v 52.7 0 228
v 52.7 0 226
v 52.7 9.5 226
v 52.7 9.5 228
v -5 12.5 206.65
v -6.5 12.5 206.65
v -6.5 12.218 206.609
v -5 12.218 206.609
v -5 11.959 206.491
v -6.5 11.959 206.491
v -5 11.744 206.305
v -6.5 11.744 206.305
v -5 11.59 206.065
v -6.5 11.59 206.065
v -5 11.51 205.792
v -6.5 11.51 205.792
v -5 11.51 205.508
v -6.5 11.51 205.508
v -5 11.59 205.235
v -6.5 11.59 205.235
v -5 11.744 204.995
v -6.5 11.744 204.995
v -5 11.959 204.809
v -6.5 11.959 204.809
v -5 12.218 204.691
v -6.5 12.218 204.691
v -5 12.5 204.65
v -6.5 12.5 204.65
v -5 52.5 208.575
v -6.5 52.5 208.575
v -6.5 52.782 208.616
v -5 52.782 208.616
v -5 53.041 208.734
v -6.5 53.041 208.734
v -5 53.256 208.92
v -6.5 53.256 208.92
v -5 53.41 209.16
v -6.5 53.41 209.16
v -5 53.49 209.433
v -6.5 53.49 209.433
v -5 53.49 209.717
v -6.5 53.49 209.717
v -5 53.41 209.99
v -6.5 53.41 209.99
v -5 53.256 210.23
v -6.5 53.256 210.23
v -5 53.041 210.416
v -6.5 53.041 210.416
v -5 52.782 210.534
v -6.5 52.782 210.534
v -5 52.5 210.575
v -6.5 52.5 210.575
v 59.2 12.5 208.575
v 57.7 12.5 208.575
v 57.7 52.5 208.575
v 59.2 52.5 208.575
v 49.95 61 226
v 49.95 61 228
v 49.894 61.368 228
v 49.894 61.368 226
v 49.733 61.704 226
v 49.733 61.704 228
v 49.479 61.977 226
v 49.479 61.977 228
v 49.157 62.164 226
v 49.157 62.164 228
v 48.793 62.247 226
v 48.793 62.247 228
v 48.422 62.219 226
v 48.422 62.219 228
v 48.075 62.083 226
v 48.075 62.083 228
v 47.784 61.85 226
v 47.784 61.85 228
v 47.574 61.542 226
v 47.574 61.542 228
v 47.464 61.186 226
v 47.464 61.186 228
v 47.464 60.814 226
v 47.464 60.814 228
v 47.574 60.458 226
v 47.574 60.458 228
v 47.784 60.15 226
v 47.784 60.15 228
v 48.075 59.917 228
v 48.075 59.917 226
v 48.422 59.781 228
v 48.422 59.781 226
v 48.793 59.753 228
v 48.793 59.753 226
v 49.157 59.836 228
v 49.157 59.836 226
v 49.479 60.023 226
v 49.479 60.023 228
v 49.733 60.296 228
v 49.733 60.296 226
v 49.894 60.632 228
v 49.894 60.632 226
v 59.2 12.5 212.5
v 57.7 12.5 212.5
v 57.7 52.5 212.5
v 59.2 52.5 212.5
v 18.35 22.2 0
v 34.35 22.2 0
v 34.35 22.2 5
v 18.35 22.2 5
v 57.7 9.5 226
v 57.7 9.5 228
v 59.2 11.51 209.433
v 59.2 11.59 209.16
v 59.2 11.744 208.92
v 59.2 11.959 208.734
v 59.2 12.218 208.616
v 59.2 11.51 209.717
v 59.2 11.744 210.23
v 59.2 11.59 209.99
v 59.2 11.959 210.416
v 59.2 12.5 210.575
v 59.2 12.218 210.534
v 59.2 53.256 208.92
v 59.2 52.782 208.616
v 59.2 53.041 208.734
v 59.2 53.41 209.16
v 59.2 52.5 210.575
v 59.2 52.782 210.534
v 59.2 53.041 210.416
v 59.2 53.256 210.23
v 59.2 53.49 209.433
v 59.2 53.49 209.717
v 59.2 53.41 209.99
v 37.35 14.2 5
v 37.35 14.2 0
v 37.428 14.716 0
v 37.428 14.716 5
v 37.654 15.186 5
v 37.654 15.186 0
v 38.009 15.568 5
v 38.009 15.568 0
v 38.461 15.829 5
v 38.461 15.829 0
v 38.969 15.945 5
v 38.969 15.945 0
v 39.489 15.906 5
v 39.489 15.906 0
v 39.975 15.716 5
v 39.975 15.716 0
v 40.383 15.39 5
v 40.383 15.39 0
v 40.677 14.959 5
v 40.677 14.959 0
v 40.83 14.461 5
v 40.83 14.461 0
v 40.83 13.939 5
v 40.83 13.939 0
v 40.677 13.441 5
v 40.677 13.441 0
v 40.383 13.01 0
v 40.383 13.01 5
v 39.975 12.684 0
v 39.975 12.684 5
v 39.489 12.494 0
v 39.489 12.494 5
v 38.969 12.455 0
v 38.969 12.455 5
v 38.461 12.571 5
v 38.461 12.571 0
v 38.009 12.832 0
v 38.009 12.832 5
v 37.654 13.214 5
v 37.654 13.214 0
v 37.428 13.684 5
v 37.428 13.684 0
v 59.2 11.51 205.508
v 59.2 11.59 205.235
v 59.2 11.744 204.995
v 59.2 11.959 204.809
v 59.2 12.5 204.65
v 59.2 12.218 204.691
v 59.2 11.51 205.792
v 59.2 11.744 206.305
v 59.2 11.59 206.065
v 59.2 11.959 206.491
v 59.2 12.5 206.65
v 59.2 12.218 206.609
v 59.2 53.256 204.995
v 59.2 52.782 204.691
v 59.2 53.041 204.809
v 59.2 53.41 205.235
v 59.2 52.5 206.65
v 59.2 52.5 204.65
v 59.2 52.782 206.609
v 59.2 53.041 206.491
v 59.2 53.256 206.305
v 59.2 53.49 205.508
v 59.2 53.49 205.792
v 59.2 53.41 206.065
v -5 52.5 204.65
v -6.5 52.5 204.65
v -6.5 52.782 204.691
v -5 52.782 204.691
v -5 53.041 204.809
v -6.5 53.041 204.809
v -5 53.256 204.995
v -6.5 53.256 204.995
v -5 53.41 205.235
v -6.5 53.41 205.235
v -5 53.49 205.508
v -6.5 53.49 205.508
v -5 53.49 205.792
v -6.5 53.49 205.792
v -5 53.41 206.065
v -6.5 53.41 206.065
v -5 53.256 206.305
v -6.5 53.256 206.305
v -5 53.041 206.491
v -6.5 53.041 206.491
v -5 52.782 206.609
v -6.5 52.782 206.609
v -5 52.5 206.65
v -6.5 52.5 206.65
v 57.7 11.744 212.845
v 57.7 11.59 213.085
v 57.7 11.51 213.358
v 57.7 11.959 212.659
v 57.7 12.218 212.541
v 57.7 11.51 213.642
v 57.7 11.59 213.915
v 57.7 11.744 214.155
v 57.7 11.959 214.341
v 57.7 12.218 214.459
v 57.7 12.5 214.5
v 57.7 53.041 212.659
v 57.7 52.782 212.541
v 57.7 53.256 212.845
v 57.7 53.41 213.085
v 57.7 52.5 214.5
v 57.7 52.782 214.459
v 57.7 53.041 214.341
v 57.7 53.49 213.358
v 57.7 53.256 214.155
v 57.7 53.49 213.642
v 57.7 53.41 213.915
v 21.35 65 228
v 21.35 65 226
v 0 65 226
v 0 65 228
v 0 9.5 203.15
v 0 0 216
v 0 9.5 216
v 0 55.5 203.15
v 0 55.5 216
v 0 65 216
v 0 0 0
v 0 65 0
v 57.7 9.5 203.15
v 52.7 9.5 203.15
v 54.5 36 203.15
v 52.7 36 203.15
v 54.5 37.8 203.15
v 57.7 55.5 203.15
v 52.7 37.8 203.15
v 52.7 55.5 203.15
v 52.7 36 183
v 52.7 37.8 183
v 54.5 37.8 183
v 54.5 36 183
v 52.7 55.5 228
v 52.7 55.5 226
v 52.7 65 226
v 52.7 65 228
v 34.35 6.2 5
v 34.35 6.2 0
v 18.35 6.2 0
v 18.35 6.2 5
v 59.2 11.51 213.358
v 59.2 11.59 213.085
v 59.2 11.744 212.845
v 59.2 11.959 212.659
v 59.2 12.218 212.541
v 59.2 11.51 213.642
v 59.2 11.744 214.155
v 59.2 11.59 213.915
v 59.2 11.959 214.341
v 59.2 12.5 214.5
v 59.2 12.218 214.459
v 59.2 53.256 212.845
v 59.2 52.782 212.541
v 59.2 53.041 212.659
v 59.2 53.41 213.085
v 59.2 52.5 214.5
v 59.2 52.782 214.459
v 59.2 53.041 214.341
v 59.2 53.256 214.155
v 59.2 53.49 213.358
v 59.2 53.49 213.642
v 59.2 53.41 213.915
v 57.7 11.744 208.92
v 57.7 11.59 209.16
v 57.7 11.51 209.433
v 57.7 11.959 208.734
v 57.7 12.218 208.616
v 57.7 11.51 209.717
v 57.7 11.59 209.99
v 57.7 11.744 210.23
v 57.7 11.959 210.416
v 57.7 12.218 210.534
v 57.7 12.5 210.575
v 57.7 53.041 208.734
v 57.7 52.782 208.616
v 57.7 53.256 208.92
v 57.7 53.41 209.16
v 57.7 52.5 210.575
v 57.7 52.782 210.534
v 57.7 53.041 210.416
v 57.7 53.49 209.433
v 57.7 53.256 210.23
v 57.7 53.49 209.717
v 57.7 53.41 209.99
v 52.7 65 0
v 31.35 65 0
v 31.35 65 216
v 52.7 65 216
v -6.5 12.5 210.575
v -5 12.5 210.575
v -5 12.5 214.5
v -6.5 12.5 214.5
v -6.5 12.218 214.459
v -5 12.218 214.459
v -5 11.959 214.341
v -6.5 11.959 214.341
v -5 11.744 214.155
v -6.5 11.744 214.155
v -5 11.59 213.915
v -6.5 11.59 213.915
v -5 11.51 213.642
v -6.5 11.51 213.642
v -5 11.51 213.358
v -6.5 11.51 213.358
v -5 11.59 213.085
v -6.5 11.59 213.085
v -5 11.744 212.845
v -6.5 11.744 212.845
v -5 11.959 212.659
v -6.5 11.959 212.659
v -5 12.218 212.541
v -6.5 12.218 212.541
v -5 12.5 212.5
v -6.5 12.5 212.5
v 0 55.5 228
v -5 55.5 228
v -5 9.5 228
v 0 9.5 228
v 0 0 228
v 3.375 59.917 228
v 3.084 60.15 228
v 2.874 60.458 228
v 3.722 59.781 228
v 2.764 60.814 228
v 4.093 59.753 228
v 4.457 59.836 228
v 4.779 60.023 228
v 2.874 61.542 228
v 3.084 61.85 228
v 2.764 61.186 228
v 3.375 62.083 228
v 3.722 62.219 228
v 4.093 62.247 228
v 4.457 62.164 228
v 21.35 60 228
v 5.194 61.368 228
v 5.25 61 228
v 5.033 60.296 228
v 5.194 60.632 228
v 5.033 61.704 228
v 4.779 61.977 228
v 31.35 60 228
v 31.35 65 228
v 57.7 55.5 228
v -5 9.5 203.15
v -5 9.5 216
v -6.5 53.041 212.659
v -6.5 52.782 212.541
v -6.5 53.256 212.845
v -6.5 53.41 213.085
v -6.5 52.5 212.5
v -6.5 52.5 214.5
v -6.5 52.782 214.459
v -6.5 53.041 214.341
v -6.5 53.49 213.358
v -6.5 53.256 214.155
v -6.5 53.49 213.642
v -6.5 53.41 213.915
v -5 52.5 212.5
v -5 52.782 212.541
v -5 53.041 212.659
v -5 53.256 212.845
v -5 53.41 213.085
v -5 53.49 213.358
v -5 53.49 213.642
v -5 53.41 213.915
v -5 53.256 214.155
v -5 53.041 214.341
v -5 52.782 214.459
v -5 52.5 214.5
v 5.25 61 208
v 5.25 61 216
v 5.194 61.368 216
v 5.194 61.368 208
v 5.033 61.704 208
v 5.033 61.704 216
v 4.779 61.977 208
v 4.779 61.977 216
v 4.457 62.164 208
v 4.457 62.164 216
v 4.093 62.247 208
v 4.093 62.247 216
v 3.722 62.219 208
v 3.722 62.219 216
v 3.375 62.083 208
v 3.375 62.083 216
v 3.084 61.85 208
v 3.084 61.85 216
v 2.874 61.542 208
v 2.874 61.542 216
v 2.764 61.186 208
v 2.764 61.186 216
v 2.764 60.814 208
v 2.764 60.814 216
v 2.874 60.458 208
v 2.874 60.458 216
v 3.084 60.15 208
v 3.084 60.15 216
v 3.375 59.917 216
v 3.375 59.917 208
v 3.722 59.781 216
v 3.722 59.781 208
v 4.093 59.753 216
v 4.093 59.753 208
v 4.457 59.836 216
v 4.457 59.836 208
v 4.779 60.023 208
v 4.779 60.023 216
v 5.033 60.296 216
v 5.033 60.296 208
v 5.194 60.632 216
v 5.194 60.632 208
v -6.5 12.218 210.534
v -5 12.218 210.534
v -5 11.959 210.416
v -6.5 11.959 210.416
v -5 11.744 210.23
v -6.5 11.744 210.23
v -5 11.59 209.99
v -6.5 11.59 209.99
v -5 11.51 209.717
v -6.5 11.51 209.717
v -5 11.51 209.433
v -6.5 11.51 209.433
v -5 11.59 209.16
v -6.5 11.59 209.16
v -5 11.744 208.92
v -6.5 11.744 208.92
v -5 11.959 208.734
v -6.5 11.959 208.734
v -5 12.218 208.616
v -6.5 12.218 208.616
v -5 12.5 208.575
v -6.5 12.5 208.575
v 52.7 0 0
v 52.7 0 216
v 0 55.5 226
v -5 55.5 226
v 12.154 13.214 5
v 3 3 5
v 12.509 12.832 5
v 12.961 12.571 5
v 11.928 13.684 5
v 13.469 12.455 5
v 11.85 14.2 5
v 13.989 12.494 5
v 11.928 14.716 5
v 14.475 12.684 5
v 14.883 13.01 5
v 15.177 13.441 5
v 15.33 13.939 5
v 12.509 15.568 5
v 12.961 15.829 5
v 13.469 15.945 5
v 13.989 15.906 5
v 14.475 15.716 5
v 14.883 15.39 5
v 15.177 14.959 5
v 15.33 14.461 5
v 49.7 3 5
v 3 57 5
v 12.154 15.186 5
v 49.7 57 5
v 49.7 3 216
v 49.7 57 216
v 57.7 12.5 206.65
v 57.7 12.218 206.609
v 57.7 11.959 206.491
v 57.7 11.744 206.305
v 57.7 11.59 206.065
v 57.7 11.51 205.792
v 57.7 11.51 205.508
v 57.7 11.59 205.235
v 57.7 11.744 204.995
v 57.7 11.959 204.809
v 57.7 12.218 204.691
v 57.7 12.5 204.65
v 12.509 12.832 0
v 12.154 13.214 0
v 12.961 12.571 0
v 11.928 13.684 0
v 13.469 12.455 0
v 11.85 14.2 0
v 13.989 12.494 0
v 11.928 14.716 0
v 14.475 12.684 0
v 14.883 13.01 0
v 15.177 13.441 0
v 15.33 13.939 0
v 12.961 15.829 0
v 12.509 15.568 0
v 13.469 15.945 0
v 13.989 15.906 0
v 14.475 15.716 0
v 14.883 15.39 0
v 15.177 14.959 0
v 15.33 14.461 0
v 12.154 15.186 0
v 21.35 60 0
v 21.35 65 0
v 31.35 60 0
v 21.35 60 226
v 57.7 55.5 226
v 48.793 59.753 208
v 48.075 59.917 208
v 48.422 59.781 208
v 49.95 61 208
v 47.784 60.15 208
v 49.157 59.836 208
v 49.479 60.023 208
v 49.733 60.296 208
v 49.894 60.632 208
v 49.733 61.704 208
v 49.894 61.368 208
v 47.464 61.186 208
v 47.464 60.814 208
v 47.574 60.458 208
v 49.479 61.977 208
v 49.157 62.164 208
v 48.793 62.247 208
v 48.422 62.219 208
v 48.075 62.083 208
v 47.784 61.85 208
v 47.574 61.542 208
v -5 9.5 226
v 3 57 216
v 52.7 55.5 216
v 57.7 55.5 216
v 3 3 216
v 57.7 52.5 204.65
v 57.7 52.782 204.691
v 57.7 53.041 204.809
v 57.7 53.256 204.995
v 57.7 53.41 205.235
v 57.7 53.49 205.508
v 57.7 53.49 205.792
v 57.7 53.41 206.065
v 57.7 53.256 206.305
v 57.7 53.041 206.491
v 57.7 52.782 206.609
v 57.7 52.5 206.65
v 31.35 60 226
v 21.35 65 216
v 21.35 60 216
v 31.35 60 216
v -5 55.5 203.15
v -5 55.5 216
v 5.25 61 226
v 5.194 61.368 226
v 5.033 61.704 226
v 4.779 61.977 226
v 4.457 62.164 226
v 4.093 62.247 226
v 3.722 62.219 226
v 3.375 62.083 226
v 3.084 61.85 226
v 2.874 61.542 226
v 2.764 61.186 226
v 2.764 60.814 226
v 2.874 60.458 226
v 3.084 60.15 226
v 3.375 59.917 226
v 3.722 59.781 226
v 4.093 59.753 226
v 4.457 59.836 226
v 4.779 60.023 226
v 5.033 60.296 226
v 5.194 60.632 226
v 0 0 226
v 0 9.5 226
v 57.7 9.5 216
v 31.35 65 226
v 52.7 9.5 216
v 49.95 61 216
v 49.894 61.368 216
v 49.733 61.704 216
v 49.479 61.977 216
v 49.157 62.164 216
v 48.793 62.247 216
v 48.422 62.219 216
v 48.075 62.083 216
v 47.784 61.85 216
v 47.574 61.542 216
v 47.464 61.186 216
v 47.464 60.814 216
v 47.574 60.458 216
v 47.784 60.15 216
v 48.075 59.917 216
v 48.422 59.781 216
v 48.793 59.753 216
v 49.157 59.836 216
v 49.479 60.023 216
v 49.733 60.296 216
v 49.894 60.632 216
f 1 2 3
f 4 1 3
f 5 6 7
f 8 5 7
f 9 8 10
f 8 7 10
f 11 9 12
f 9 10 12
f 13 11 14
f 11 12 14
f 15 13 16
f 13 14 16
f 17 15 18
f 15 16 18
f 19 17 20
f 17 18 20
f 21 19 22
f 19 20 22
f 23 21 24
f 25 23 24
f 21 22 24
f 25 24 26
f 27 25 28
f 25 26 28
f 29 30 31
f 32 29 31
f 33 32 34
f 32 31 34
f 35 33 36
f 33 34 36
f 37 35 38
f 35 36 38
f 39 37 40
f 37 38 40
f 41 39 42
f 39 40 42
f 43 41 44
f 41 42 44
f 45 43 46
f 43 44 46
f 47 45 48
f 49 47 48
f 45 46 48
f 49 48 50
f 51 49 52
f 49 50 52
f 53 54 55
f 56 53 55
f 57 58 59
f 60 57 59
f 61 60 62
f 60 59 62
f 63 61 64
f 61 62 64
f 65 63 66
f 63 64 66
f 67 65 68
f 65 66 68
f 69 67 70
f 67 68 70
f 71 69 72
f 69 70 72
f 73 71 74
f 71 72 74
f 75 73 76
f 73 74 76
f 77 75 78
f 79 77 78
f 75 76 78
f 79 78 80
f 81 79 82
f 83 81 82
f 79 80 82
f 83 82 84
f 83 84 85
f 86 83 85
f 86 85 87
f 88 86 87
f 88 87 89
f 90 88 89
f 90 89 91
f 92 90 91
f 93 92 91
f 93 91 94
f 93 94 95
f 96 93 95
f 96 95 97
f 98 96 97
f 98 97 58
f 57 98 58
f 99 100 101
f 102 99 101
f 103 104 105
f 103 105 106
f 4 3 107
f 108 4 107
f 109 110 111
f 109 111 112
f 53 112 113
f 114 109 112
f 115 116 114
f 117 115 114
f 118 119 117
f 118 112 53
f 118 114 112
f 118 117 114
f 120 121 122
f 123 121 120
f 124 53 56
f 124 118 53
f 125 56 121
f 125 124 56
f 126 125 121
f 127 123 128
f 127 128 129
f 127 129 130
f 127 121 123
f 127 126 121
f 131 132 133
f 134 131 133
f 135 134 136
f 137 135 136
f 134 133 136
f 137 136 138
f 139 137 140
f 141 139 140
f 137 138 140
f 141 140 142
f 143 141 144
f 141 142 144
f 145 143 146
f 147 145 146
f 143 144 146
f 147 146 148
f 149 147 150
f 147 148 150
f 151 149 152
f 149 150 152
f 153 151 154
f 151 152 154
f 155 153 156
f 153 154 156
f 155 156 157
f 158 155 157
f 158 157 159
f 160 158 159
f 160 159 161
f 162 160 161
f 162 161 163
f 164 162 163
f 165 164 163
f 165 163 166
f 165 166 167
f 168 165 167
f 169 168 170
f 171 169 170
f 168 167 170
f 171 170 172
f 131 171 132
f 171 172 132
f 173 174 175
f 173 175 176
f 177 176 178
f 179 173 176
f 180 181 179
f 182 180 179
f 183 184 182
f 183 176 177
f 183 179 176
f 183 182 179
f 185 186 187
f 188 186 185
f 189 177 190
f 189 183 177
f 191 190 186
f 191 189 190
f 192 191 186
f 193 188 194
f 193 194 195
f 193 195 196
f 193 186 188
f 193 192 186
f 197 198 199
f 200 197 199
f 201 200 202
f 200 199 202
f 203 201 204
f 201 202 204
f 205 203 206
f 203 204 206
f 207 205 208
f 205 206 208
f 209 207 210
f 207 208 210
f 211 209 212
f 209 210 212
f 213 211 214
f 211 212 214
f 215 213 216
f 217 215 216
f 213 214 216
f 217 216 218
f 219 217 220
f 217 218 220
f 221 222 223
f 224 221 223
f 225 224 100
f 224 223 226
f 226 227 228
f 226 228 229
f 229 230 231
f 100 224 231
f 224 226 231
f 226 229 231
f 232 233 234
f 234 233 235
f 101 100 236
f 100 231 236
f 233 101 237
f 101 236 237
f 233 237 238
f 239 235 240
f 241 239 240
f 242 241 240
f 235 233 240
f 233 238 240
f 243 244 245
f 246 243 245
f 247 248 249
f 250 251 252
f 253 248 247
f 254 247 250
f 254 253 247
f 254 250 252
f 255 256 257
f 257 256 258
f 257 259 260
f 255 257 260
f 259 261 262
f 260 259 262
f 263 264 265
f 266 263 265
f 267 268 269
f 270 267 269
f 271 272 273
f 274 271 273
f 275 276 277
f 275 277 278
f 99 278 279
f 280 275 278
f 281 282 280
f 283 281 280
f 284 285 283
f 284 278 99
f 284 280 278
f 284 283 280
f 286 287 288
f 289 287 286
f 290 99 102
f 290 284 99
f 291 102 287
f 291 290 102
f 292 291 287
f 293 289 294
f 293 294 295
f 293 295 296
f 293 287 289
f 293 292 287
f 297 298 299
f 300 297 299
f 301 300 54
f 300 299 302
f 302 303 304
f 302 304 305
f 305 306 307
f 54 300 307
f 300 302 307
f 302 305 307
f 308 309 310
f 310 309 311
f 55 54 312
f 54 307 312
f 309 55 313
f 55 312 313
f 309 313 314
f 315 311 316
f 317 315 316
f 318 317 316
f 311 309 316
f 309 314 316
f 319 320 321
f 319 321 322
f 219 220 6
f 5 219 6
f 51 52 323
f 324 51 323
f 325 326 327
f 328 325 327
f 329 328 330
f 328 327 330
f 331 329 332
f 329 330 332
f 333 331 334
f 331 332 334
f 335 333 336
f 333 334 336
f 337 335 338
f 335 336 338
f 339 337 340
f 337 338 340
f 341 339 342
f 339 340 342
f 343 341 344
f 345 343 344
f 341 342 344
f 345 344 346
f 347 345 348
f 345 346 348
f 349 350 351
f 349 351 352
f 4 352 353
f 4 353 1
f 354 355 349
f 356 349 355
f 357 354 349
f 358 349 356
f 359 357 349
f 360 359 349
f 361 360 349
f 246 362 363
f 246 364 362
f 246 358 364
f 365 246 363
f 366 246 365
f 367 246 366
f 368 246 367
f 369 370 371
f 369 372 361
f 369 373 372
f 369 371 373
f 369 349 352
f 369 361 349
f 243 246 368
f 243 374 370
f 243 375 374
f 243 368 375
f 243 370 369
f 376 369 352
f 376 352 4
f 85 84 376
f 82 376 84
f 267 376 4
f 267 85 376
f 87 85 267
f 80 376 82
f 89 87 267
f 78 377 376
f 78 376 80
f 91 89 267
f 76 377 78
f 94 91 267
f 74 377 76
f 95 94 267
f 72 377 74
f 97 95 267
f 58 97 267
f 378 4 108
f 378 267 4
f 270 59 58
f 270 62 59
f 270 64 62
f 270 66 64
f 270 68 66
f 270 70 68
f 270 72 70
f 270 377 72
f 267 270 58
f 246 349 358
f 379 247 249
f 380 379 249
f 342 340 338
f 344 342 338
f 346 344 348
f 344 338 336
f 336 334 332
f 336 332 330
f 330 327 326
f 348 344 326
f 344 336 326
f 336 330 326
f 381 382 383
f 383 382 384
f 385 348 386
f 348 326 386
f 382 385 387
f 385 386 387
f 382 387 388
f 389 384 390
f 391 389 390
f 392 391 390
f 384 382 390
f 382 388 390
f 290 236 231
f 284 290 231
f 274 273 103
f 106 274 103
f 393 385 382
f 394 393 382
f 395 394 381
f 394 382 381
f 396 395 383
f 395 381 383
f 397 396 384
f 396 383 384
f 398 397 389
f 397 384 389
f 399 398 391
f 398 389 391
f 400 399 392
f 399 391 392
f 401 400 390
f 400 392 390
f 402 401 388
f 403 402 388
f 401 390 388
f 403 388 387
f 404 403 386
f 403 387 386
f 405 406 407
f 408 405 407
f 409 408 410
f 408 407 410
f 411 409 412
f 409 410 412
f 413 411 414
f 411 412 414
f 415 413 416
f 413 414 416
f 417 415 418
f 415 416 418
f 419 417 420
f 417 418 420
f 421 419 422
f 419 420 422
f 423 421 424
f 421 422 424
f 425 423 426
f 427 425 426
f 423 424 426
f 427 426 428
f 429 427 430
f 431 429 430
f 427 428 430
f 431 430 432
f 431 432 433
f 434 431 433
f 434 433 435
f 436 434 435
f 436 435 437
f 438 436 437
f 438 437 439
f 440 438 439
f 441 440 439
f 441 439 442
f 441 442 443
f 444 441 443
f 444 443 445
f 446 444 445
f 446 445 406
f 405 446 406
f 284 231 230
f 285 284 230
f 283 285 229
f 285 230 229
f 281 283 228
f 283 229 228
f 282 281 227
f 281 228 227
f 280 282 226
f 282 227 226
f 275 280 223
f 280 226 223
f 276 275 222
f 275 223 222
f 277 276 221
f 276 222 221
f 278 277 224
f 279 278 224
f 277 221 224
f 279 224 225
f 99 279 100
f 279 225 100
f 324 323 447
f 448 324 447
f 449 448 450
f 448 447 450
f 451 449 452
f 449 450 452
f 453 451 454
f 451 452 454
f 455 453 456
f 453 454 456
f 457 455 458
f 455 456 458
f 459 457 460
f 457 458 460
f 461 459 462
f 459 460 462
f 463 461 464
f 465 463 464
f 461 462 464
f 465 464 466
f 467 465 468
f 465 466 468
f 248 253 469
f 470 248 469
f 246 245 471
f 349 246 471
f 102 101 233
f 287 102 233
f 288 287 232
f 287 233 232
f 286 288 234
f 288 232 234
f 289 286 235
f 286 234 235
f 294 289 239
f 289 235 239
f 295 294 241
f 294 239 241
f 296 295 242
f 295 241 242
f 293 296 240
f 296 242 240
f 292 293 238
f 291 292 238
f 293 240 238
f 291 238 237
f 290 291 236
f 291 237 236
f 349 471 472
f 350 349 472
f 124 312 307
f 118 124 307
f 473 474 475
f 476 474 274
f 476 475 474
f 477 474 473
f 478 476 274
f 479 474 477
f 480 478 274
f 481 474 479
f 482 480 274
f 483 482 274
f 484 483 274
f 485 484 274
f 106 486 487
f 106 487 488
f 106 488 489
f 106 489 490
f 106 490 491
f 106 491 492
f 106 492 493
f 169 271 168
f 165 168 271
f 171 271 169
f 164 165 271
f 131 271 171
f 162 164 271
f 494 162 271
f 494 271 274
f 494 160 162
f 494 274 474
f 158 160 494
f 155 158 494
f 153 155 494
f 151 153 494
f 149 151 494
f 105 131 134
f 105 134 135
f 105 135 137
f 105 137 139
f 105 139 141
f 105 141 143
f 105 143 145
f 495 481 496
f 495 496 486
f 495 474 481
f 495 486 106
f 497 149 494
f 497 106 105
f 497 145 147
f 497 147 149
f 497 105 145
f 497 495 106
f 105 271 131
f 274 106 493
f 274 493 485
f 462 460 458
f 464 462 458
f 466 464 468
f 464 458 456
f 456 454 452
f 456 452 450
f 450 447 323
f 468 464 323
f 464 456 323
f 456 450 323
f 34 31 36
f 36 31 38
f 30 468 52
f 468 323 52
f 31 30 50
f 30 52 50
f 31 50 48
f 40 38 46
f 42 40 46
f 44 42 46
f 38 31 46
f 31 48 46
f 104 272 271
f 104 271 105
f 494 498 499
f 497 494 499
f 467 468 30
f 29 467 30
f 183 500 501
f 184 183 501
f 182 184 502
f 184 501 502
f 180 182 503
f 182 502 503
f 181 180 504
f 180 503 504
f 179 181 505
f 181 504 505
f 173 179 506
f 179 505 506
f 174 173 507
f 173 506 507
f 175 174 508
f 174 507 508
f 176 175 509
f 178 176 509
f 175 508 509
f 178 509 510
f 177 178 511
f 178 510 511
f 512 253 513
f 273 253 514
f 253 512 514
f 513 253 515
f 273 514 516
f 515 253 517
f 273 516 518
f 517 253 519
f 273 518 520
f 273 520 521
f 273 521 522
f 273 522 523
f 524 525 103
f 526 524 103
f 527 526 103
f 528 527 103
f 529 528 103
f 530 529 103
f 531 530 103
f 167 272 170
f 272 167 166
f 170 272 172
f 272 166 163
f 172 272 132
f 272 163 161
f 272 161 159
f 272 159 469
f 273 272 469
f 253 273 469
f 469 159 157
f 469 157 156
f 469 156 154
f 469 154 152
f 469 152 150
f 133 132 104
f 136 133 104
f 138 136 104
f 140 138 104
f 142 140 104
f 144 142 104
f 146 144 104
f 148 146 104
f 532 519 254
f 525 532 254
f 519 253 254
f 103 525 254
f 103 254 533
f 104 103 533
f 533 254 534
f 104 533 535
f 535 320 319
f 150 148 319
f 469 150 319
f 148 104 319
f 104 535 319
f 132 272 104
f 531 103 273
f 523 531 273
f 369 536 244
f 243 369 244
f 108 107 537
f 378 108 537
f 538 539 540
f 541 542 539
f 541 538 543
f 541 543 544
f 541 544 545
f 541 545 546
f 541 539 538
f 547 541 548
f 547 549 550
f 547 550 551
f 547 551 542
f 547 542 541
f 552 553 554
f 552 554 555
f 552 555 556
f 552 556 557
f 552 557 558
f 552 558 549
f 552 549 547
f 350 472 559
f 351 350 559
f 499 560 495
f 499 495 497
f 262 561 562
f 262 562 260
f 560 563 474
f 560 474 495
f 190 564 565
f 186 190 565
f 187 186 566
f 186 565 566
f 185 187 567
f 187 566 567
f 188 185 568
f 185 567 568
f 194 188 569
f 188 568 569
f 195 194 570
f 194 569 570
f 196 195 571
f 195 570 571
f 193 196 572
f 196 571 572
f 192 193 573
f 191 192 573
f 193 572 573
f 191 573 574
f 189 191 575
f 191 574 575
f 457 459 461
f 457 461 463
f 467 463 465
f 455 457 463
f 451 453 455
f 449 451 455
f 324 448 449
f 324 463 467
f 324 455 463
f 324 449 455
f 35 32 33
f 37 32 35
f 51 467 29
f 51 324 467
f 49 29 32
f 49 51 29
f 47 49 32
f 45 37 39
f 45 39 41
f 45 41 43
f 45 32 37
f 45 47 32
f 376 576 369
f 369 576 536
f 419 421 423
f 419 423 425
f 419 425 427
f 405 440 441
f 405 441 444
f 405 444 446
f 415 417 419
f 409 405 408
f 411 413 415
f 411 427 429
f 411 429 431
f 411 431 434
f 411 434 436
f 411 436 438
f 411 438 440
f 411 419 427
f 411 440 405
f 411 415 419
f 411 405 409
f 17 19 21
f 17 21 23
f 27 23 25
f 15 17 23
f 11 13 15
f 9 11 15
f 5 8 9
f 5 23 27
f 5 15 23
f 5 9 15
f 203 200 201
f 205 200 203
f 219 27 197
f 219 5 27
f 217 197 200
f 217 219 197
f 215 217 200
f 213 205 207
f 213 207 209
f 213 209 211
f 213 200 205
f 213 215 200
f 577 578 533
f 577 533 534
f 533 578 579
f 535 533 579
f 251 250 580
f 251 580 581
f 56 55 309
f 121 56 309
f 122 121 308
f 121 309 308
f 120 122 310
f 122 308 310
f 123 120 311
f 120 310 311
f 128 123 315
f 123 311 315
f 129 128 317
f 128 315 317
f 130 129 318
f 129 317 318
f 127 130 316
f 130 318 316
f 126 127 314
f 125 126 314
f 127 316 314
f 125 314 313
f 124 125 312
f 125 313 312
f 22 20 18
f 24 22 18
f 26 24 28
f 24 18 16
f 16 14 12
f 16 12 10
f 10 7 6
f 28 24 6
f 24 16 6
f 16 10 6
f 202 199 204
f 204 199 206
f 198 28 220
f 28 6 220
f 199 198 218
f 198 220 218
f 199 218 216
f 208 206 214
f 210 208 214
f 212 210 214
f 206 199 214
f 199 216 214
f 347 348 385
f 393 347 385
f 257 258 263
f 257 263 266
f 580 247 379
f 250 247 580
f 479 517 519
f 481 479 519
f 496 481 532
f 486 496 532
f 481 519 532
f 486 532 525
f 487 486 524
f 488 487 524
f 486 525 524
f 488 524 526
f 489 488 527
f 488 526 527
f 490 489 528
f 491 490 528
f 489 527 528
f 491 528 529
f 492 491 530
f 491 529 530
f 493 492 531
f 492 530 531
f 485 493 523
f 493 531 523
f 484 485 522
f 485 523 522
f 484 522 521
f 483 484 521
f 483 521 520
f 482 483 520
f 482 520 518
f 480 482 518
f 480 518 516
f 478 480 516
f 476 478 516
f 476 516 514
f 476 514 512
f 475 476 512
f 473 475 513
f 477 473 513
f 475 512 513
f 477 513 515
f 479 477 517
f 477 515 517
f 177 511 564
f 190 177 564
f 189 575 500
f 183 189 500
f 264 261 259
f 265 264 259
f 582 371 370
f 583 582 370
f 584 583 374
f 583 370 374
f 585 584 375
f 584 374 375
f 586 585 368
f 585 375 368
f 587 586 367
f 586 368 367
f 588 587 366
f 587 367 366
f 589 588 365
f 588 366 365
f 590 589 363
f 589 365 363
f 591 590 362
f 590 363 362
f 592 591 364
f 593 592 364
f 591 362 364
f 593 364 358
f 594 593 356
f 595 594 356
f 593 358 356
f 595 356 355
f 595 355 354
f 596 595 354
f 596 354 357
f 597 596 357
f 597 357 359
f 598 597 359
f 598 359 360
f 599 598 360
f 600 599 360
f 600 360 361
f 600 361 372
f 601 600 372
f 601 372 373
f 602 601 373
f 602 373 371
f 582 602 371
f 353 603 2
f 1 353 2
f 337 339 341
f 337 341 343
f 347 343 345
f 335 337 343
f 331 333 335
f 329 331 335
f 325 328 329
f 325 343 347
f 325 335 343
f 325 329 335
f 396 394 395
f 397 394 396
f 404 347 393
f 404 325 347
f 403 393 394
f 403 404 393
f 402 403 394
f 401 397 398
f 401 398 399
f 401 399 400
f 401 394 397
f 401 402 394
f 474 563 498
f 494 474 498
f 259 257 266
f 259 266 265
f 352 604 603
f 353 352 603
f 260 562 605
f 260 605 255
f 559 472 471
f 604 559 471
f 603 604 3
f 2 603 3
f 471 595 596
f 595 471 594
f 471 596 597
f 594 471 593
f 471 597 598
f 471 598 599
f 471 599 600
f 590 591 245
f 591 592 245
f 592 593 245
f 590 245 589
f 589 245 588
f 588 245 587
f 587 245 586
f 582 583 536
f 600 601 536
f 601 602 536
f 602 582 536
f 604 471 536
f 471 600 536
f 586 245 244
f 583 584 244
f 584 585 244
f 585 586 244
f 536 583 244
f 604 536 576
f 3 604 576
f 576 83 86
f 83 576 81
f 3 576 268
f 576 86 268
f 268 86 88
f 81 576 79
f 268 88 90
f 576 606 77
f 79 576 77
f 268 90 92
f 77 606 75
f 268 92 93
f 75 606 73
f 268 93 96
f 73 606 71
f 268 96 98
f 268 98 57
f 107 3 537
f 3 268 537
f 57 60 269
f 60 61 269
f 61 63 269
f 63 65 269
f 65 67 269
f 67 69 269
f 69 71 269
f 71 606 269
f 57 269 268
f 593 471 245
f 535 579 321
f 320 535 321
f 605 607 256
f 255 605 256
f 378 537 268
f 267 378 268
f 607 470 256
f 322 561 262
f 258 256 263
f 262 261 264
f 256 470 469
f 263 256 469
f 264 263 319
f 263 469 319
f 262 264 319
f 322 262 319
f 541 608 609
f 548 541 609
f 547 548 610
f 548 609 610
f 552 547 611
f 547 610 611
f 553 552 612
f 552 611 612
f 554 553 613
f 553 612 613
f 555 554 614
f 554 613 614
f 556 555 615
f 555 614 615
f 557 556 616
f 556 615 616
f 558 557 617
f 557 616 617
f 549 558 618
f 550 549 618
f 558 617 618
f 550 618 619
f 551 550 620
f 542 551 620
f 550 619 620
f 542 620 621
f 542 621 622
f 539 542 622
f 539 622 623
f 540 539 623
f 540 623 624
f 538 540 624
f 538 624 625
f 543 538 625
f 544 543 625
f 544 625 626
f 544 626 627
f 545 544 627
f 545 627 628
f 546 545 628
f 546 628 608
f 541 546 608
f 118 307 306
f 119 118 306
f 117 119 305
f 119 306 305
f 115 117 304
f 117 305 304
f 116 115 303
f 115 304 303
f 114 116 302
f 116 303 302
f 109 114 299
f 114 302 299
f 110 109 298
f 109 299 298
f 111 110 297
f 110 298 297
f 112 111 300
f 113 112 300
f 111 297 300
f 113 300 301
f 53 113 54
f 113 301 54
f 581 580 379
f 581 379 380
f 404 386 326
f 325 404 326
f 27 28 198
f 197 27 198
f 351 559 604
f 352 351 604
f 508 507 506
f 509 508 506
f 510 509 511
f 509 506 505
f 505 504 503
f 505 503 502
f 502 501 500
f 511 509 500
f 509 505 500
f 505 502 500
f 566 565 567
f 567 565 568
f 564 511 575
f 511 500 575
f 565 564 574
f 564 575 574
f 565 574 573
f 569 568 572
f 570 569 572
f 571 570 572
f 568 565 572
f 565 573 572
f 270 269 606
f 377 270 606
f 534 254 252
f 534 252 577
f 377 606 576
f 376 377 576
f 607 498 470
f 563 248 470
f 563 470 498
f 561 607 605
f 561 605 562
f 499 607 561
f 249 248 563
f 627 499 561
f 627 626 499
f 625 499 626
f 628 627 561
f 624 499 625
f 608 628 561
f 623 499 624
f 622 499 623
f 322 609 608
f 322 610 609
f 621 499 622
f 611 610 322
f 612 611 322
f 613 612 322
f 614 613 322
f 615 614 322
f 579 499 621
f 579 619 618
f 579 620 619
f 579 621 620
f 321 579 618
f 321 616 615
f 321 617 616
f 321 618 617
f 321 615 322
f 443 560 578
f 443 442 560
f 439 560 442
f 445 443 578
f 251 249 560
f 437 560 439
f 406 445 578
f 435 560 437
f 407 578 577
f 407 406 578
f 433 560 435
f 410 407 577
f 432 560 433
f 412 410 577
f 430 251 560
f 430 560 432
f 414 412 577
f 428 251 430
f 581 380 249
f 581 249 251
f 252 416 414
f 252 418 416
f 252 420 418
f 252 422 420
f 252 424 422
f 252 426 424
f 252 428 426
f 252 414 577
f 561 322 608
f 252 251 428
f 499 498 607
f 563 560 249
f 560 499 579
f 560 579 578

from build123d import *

# Parameters (mm, degrees)
SKETCH_1_W             = 52.7
SKETCH_1_H             = 65
EXTRUDE_1_DEPTH        = 216
SKETCH_2_W             = 10
SKETCH_2_H             = 5
CUT_EXTRUDE_1_DEPTH    = 232.642591075
SKETCH_3_W             = 46.7
SKETCH_3_H             = 54
CUT_EXTRUDE_2_DEPTH    = 211
SKETCH_6_R             = 1.75
SKETCH_6_W             = 16
SKETCH_6_H             = 16
CUT_EXTRUDE_3_DEPTH    = 5
SKETCH_7_W             = 1.8
SKETCH_7_H             = 1.8
EXTRUDE_2_DEPTH        = 33
SKETCH_9_W             = 12.85
SKETCH_9_H             = 46
EXTRUDE_3_DEPTH        = 5
SKETCH_10_W            = 12.85
SKETCH_10_H            = 46
EXTRUDE_4_DEPTH        = 5
EXTRUDE_5_DEPTH        = 1.5
EXTRUDE_START          = 1.5
EXTRUDE_6_DEPTH        = 1.5
EXTRUDE_7_DEPTH        = 2
SKETCH_15_R            = 1.25
CUT_EXTRUDE_4_DEPTH    = 20
SPLIT_START            = 57.7
SPLIT_BODIES_1_DEPTH   = 1.5
SPLIT_BODIES_1_2_DEPTH = 1.5
SPLIT_BODIES_1_3_DEPTH = 1.5
SPLIT_START_2          = -6.5
SPLIT_BODIES_1_4_DEPTH = 1.5
SPLIT_BODIES_1_5_DEPTH = 1.5
SPLIT_BODIES_1_6_DEPTH = 1.5
SPLIT_BODIES_1_7_DEPTH = 1.5
SPLIT_BODIES_1_8_DEPTH = 1.5


# Read off the part's stored shape, not the designer's step: 分割1
with BuildPart() as part:
    # 草图1 → 凸台-拉伸1 (new body)
    with BuildSketch(Plane.XY):
        with Locations((26.35, 32.5)):
            Rectangle(SKETCH_1_W, SKETCH_1_H)
    extrude(amount=EXTRUDE_1_DEPTH)

    # 草图2 → 切除-拉伸1 (cut, through all)
    with BuildSketch(Plane.XY.offset(216)):
        with Locations((26.35, 62.5)):
            Rectangle(SKETCH_2_W, SKETCH_2_H)
    extrude(amount=-CUT_EXTRUDE_1_DEPTH, mode=Mode.SUBTRACT)

    # 草图3 → 切除-拉伸2 (cut)
    with BuildSketch(Plane.XY.offset(216)):
        with Locations((26.35, 30)):
            Rectangle(SKETCH_3_W, SKETCH_3_H)
    extrude(amount=-CUT_EXTRUDE_2_DEPTH, mode=Mode.SUBTRACT)

    # 草图6 → 切除-拉伸3 (cut)
    with BuildSketch(Plane(origin=(0, 0, 0), x_dir=(-1, 0, 0), z_dir=(0, 0, -1))):
        with Locations((-13.6, 14.2)):
            Circle(SKETCH_6_R)
        with Locations((-39.1, 14.2)):
            Circle(SKETCH_6_R)
        with Locations((-26.35, 14.2)):
            Rectangle(SKETCH_6_W, SKETCH_6_H)
    extrude(amount=-CUT_EXTRUDE_3_DEPTH, mode=Mode.SUBTRACT)

    # 草图7 → 凸台-拉伸2 (add)
    with BuildSketch(Plane.XY.offset(216)):
        with Locations((53.6, 36.9)):
            Rectangle(SKETCH_7_W, SKETCH_7_H)
    extrude(amount=-EXTRUDE_2_DEPTH)

    # 草图9 → 凸台-拉伸3 (add)
    with BuildSketch(Plane.ZY):
        with Locations((209.575, 32.5)):
            Rectangle(SKETCH_9_W, SKETCH_9_H)
    extrude(amount=EXTRUDE_3_DEPTH)

    # 草图10 → 凸台-拉伸4 (add)
    with BuildSketch(Plane(origin=(52.7, 0, 0), x_dir=(0, 0, -1), z_dir=(1, 0, 0))):
        with Locations((-209.575, 32.5)):
            Rectangle(SKETCH_10_W, SKETCH_10_H)
    extrude(amount=EXTRUDE_4_DEPTH)

    # 草图11 → 凸台-拉伸5 (add)
    with BuildSketch(Plane(origin=(57.7, 0, 0), x_dir=(0, 0, -1), z_dir=(1, 0, 0))):
        with BuildLine():
            Line((-214.5, 12.5), (-214.5, 52.5))
            ThreePointArc((-214.5, 52.5), (-213.5, 53.5), (-212.5, 52.5))
            Line((-212.5, 52.5), (-212.5, 12.5))
            ThreePointArc((-212.5, 12.5), (-213.5, 11.5), (-214.5, 12.5))
        make_face()
        with BuildLine():
            Line((-210.575, 12.5), (-210.575, 52.5))
            ThreePointArc((-210.575, 52.5), (-209.575, 53.5), (-208.575, 52.5))
            Line((-208.575, 52.5), (-208.575, 12.5))
            ThreePointArc((-208.575, 12.5), (-209.575, 11.5), (-210.575, 12.5))
        make_face()
        with BuildLine():
            Line((-206.65, 12.5), (-206.65, 52.5))
            ThreePointArc((-206.65, 52.5), (-205.65, 53.5), (-204.65, 52.5))
            Line((-204.65, 52.5), (-204.65, 12.5))
            ThreePointArc((-204.65, 12.5), (-205.65, 11.5), (-206.65, 12.5))
        make_face()
    extrude(amount=EXTRUDE_5_DEPTH)

    # 草图12 → 凸台-拉伸6 (add)
    with BuildSketch(Plane.ZY.offset(5).offset(EXTRUDE_START)):
        with BuildLine():
            Line((214.5, 12.5), (214.5, 52.5))
            ThreePointArc((214.5, 52.5), (213.5, 53.5), (212.5, 52.5))
            Line((212.5, 52.5), (212.5, 12.5))
            ThreePointArc((212.5, 12.5), (213.5, 11.5), (214.5, 12.5))
        make_face()
        with BuildLine():
            Line((206.65, 12.5), (206.65, 52.5))
            ThreePointArc((206.65, 52.5), (205.65, 53.5), (204.65, 52.5))
            Line((204.65, 52.5), (204.65, 12.5))
            ThreePointArc((204.65, 12.5), (205.65, 11.5), (206.65, 12.5))
        make_face()
        with BuildLine():
            Line((210.575, 12.5), (210.575, 52.5))
            ThreePointArc((210.575, 52.5), (209.575, 53.5), (208.575, 52.5))
            Line((208.575, 52.5), (208.575, 12.5))
            ThreePointArc((208.575, 12.5), (209.575, 11.5), (210.575, 12.5))
        make_face()
    extrude(amount=-EXTRUDE_6_DEPTH)


with BuildPart() as body_2:
    # 草图14 → 凸台-拉伸7 (new body)
    with BuildSketch(Plane.XY.offset(226)):
        Polygon((57.7, 55.5), (52.7, 55.5), (52.7, 65), (31.35, 65), (31.35, 60), (21.35, 60), (21.35, 65), (0, 65), (0, 55.5), (-5, 55.5), (-5, 9.5), (0, 9.5), (0, 0), (52.7, 0), (52.7, 9.5), (57.7, 9.5), align=None)
    extrude(amount=EXTRUDE_7_DEPTH)


with BuildPart() as cut_extrude_4_tool:
    # 草图15 → 切除-拉伸4 (new body)
    with BuildSketch(Plane.XY.offset(228)):
        with Locations((4, 61)):
            Circle(SKETCH_15_R)
        with Locations((48.7, 61)):
            Circle(SKETCH_15_R)
    extrude(amount=-CUT_EXTRUDE_4_DEPTH)


with BuildPart() as part_1:
    add(part.part)

    # 切除-拉伸4: cut by cut_extrude_4_tool
    add(cut_extrude_4_tool.part, mode=Mode.SUBTRACT)

    # Split Bodies 1 7 outline → Split Bodies 1 7 (cut)
    with BuildSketch(Plane.YZ.offset(SPLIT_START_2)):
        with BuildLine():
            ThreePointArc((12.5, 214.5), (11.5, 213.5), (12.5, 212.5))
            Line((12.5, 212.5), (52.5, 212.5))
            ThreePointArc((52.5, 212.5), (53.5, 213.5), (52.5, 214.5))
            Line((52.5, 214.5), (12.5, 214.5))
        make_face()
        with BuildLine():
            ThreePointArc((12.5, 210.575), (11.5, 209.575), (12.5, 208.575))
            Line((12.5, 208.575), (52.5, 208.575))
            ThreePointArc((52.5, 208.575), (53.5, 209.575), (52.5, 210.575))
            Line((52.5, 210.575), (12.5, 210.575))
        make_face()
        with BuildLine():
            ThreePointArc((12.5, 206.65), (11.5, 205.65), (12.5, 204.65))
            Line((12.5, 204.65), (52.5, 204.65))
            ThreePointArc((52.5, 204.65), (53.5, 205.65), (52.5, 206.65))
            Line((52.5, 206.65), (12.5, 206.65))
        make_face()
    extrude(amount=SPLIT_BODIES_1_7_DEPTH, mode=Mode.SUBTRACT)

    # Split Bodies 1 8 outline → Split Bodies 1 8 (cut)
    with BuildSketch(Plane.YZ.offset(SPLIT_START)):
        with BuildLine():
            ThreePointArc((12.5, 214.5), (11.5, 213.5), (12.5, 212.5))
            Line((12.5, 212.5), (52.5, 212.5))
            ThreePointArc((52.5, 212.5), (53.5, 213.5), (52.5, 214.5))
            Line((52.5, 214.5), (12.5, 214.5))
        make_face()
        with BuildLine():
            ThreePointArc((12.5, 210.575), (11.5, 209.575), (12.5, 208.575))
            Line((12.5, 208.575), (52.5, 208.575))
            ThreePointArc((52.5, 208.575), (53.5, 209.575), (52.5, 210.575))
            Line((52.5, 210.575), (12.5, 210.575))
        make_face()
        with BuildLine():
            ThreePointArc((12.5, 206.65), (11.5, 205.65), (12.5, 204.65))
            Line((12.5, 204.65), (52.5, 204.65))
            ThreePointArc((52.5, 204.65), (53.5, 205.65), (52.5, 206.65))
            Line((52.5, 206.65), (12.5, 206.65))
        make_face()
    extrude(amount=SPLIT_BODIES_1_8_DEPTH, mode=Mode.SUBTRACT)


with BuildPart() as body_2_1:
    add(body_2.part)

    # 切除-拉伸4: cut by cut_extrude_4_tool
    add(cut_extrude_4_tool.part, mode=Mode.SUBTRACT)


with BuildPart() as body_3:
    # Split Bodies 1 outline → Split Bodies 1 (new body)
    with BuildSketch(Plane.YZ.offset(SPLIT_START)):
        with BuildLine():
            Line((12.5, 212.5), (52.5, 212.5))
            ThreePointArc((52.5, 212.5), (53.5, 213.5), (52.5, 214.5))
            Line((52.5, 214.5), (12.5, 214.5))
            ThreePointArc((12.5, 214.5), (11.5, 213.5), (12.5, 212.5))
        make_face()
    extrude(amount=SPLIT_BODIES_1_DEPTH)


with BuildPart() as body_4:
    # Split Bodies 1 2 outline → Split Bodies 1 2 (new body)
    with BuildSketch(Plane.YZ.offset(SPLIT_START)):
        with BuildLine():
            Line((12.5, 208.575), (52.5, 208.575))
            ThreePointArc((52.5, 208.575), (53.5, 209.575), (52.5, 210.575))
            Line((52.5, 210.575), (12.5, 210.575))
            ThreePointArc((12.5, 210.575), (11.5, 209.575), (12.5, 208.575))
        make_face()
    extrude(amount=SPLIT_BODIES_1_2_DEPTH)


with BuildPart() as body_5:
    # Split Bodies 1 3 outline → Split Bodies 1 3 (new body)
    with BuildSketch(Plane.YZ.offset(SPLIT_START)):
        with BuildLine():
            Line((12.5, 204.65), (52.5, 204.65))
            ThreePointArc((52.5, 204.65), (53.5, 205.65), (52.5, 206.65))
            Line((52.5, 206.65), (12.5, 206.65))
            ThreePointArc((12.5, 206.65), (11.5, 205.65), (12.5, 204.65))
        make_face()
    extrude(amount=SPLIT_BODIES_1_3_DEPTH)


with BuildPart() as body_6:
    # Split Bodies 1 4 outline → Split Bodies 1 4 (new body)
    with BuildSketch(Plane.YZ.offset(SPLIT_START_2)):
        with BuildLine():
            Line((52.5, 214.5), (12.5, 214.5))
            ThreePointArc((12.5, 214.5), (11.5, 213.5), (12.5, 212.5))
            Line((12.5, 212.5), (52.5, 212.5))
            ThreePointArc((52.5, 212.5), (53.5, 213.5), (52.5, 214.5))
        make_face()
    extrude(amount=SPLIT_BODIES_1_4_DEPTH)


with BuildPart() as body_7:
    # Split Bodies 1 5 outline → Split Bodies 1 5 (new body)
    with BuildSketch(Plane.YZ.offset(SPLIT_START_2)):
        with BuildLine():
            Line((52.5, 206.65), (12.5, 206.65))
            ThreePointArc((12.5, 206.65), (11.5, 205.65), (12.5, 204.65))
            Line((12.5, 204.65), (52.5, 204.65))
            ThreePointArc((52.5, 204.65), (53.5, 205.65), (52.5, 206.65))
        make_face()
    extrude(amount=SPLIT_BODIES_1_5_DEPTH)


with BuildPart() as body_8:
    # Split Bodies 1 6 outline → Split Bodies 1 6 (new body)
    with BuildSketch(Plane.YZ.offset(SPLIT_START_2)):
        with BuildLine():
            Line((52.5, 210.575), (12.5, 210.575))
            ThreePointArc((12.5, 210.575), (11.5, 209.575), (12.5, 208.575))
            Line((12.5, 208.575), (52.5, 208.575))
            ThreePointArc((52.5, 208.575), (53.5, 209.575), (52.5, 210.575))
        make_face()
    extrude(amount=SPLIT_BODIES_1_6_DEPTH)


solid = Compound([part_1.part, body_2_1.part, body_3.part, body_4.part, body_5.part, body_6.part, body_7.part, body_8.part])
